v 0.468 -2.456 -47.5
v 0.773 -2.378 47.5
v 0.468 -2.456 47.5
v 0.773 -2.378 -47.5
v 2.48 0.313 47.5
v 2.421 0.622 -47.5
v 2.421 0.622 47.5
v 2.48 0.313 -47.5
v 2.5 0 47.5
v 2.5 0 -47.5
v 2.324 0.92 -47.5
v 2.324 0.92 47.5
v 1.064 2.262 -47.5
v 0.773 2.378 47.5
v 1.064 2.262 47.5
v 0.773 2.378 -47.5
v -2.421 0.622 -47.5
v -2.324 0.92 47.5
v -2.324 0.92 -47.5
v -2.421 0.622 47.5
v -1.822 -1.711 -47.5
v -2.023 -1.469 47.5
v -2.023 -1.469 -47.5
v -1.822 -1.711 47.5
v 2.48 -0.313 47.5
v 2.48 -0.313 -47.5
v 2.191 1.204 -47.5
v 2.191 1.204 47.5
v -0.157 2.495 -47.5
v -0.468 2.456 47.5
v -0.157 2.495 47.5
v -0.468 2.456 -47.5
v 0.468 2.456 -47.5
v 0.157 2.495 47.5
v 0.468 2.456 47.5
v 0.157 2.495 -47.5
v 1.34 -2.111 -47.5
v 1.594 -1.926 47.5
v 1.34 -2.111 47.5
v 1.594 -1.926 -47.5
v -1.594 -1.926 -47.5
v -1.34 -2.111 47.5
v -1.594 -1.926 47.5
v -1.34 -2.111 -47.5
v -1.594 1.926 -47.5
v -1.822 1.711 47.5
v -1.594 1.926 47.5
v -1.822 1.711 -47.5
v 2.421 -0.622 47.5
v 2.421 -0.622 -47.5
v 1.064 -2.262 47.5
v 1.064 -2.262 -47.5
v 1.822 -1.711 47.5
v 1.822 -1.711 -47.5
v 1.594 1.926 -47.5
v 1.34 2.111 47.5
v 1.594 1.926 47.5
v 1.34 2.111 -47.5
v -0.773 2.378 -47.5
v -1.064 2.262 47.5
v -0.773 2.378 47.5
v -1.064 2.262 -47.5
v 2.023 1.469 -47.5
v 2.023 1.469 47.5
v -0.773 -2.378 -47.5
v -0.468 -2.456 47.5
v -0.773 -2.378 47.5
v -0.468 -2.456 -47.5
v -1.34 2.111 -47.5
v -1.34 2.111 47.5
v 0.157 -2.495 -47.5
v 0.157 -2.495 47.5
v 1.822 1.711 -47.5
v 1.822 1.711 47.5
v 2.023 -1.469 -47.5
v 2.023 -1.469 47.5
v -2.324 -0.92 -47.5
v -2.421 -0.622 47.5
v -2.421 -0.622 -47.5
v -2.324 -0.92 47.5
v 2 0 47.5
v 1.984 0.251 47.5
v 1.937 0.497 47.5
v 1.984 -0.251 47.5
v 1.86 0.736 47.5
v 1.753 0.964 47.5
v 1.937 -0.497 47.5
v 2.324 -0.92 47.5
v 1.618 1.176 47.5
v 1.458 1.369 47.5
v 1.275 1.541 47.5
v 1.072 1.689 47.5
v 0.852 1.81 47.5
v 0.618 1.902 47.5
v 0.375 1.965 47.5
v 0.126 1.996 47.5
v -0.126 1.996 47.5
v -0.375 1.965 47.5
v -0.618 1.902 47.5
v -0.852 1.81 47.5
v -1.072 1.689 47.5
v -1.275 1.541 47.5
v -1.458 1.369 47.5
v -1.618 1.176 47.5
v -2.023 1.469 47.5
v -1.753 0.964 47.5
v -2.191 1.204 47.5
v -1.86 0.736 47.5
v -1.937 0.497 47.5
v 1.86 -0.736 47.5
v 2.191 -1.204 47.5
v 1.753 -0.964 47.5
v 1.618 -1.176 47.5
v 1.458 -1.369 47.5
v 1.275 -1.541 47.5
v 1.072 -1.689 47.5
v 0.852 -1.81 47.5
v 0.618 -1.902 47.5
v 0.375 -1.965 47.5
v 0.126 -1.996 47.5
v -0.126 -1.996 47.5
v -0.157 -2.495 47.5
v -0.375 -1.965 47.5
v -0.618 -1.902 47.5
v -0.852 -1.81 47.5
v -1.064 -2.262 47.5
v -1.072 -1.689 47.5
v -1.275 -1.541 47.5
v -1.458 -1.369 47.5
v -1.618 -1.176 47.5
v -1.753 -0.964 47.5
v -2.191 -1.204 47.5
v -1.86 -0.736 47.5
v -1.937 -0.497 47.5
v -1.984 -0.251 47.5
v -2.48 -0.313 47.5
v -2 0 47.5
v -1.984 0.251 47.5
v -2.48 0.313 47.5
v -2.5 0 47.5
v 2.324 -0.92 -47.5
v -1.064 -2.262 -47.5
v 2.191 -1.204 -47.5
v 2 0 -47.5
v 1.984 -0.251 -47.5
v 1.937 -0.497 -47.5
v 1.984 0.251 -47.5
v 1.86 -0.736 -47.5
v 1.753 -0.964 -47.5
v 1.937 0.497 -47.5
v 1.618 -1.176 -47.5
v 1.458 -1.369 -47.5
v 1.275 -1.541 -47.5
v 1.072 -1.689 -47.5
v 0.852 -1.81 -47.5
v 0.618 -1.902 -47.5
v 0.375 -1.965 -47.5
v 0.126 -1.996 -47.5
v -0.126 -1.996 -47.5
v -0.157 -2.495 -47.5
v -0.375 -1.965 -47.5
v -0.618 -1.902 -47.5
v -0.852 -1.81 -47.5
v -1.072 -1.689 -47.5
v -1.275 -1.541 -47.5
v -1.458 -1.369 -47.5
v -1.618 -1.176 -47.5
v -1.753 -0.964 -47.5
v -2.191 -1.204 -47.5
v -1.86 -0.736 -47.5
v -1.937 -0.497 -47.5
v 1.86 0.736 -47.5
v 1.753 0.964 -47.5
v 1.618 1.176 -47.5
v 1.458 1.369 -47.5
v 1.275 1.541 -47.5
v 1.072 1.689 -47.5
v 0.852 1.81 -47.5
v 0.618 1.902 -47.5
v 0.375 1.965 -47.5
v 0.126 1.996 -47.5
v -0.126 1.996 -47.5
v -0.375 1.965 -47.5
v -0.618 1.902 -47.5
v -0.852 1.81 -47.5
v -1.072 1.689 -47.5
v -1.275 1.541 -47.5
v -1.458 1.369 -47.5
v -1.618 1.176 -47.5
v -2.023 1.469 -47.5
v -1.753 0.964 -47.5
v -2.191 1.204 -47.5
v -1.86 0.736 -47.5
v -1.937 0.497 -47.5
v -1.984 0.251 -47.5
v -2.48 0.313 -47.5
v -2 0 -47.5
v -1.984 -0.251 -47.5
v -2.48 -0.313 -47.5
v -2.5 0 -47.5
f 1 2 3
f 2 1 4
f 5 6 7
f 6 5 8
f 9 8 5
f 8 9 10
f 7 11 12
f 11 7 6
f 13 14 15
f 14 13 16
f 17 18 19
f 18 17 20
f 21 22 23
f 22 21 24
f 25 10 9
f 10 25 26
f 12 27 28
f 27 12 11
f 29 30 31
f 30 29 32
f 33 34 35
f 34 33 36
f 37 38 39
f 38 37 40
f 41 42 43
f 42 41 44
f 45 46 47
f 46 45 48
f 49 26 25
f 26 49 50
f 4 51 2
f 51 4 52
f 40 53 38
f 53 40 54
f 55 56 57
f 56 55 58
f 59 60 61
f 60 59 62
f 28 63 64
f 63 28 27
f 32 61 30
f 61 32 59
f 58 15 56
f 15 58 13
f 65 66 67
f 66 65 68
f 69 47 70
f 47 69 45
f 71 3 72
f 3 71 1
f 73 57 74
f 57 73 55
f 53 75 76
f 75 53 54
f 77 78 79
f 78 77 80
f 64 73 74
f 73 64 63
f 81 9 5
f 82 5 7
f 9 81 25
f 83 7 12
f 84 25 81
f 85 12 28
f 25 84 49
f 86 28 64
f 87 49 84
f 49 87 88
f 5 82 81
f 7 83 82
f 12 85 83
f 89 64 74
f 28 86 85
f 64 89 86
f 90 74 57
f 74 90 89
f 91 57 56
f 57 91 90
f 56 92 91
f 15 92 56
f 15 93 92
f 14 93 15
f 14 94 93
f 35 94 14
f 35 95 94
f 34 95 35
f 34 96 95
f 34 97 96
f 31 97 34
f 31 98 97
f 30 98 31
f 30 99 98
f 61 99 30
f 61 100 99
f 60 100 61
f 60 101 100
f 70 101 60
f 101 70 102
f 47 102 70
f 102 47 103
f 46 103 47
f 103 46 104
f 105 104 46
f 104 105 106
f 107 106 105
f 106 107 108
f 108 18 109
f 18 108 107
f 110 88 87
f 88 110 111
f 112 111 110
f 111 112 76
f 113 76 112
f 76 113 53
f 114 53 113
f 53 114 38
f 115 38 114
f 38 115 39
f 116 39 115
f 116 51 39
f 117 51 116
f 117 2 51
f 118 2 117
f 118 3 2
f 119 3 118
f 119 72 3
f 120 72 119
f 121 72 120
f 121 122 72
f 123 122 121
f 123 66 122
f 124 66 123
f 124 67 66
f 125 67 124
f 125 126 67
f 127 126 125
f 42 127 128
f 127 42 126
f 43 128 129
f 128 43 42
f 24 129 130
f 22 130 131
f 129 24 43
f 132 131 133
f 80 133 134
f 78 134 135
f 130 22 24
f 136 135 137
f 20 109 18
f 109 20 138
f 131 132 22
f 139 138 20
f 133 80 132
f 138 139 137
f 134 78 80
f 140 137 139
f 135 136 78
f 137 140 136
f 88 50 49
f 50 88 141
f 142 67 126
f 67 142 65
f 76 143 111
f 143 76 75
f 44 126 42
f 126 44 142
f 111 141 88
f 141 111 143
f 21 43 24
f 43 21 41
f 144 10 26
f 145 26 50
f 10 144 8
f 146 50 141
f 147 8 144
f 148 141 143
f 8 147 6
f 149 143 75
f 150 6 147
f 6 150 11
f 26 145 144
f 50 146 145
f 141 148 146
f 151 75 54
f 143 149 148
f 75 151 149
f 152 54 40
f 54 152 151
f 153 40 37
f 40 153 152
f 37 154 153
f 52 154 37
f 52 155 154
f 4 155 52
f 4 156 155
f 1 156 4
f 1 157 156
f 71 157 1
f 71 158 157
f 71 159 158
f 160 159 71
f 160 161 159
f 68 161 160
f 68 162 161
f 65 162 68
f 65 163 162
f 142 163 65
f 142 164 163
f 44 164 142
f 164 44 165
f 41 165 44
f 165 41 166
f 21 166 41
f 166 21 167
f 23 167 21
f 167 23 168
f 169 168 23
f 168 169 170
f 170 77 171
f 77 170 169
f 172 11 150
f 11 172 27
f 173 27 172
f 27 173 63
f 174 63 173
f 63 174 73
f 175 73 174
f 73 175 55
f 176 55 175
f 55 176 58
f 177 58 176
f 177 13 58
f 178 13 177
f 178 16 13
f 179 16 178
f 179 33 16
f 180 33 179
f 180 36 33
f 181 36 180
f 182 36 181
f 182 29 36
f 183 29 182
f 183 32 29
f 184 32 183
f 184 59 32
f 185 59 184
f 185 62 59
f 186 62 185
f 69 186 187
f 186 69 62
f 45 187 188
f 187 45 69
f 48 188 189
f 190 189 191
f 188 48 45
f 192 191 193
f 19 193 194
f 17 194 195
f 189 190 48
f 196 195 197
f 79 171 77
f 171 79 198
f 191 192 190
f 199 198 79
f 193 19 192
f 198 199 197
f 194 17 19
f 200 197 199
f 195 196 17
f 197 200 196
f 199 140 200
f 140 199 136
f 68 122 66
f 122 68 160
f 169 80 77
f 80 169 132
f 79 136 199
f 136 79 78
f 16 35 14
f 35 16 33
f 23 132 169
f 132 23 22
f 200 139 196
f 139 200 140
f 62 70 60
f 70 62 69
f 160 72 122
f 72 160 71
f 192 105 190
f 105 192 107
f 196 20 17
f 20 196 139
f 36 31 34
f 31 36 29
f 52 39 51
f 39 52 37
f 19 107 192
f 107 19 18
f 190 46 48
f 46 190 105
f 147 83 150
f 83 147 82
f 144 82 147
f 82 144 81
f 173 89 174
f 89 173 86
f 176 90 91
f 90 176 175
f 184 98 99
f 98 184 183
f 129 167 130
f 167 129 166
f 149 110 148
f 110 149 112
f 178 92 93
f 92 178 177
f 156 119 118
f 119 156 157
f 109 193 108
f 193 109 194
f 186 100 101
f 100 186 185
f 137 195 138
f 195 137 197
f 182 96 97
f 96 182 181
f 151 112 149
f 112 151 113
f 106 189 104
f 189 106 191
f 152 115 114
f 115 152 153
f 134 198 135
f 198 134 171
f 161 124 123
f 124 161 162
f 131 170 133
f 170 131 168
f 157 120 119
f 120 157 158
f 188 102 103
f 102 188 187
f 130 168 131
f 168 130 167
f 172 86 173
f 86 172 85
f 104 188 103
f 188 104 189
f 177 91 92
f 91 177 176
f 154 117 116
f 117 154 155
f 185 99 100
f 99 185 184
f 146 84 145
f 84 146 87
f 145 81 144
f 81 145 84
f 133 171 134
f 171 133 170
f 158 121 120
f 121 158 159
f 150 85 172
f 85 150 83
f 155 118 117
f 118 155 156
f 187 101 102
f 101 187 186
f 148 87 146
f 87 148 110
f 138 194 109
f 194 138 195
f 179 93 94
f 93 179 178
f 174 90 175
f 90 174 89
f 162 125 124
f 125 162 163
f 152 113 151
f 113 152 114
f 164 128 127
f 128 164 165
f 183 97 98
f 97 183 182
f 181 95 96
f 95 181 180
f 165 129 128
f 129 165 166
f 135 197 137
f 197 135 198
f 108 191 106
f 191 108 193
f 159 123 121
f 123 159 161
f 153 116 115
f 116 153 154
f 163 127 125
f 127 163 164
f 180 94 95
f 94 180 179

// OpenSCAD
$fn = 50;


difference() {
	union() {
		translate(v = [0, 0, -47.5000000000]) {
			cylinder(h = 95, r = 2.5000000000);
		}
	}
	union() {
		translate(v = [0, 0, -100.0000000000]) {
			cylinder(h = 200, r = 2.0000000000);
		}
	}
}
